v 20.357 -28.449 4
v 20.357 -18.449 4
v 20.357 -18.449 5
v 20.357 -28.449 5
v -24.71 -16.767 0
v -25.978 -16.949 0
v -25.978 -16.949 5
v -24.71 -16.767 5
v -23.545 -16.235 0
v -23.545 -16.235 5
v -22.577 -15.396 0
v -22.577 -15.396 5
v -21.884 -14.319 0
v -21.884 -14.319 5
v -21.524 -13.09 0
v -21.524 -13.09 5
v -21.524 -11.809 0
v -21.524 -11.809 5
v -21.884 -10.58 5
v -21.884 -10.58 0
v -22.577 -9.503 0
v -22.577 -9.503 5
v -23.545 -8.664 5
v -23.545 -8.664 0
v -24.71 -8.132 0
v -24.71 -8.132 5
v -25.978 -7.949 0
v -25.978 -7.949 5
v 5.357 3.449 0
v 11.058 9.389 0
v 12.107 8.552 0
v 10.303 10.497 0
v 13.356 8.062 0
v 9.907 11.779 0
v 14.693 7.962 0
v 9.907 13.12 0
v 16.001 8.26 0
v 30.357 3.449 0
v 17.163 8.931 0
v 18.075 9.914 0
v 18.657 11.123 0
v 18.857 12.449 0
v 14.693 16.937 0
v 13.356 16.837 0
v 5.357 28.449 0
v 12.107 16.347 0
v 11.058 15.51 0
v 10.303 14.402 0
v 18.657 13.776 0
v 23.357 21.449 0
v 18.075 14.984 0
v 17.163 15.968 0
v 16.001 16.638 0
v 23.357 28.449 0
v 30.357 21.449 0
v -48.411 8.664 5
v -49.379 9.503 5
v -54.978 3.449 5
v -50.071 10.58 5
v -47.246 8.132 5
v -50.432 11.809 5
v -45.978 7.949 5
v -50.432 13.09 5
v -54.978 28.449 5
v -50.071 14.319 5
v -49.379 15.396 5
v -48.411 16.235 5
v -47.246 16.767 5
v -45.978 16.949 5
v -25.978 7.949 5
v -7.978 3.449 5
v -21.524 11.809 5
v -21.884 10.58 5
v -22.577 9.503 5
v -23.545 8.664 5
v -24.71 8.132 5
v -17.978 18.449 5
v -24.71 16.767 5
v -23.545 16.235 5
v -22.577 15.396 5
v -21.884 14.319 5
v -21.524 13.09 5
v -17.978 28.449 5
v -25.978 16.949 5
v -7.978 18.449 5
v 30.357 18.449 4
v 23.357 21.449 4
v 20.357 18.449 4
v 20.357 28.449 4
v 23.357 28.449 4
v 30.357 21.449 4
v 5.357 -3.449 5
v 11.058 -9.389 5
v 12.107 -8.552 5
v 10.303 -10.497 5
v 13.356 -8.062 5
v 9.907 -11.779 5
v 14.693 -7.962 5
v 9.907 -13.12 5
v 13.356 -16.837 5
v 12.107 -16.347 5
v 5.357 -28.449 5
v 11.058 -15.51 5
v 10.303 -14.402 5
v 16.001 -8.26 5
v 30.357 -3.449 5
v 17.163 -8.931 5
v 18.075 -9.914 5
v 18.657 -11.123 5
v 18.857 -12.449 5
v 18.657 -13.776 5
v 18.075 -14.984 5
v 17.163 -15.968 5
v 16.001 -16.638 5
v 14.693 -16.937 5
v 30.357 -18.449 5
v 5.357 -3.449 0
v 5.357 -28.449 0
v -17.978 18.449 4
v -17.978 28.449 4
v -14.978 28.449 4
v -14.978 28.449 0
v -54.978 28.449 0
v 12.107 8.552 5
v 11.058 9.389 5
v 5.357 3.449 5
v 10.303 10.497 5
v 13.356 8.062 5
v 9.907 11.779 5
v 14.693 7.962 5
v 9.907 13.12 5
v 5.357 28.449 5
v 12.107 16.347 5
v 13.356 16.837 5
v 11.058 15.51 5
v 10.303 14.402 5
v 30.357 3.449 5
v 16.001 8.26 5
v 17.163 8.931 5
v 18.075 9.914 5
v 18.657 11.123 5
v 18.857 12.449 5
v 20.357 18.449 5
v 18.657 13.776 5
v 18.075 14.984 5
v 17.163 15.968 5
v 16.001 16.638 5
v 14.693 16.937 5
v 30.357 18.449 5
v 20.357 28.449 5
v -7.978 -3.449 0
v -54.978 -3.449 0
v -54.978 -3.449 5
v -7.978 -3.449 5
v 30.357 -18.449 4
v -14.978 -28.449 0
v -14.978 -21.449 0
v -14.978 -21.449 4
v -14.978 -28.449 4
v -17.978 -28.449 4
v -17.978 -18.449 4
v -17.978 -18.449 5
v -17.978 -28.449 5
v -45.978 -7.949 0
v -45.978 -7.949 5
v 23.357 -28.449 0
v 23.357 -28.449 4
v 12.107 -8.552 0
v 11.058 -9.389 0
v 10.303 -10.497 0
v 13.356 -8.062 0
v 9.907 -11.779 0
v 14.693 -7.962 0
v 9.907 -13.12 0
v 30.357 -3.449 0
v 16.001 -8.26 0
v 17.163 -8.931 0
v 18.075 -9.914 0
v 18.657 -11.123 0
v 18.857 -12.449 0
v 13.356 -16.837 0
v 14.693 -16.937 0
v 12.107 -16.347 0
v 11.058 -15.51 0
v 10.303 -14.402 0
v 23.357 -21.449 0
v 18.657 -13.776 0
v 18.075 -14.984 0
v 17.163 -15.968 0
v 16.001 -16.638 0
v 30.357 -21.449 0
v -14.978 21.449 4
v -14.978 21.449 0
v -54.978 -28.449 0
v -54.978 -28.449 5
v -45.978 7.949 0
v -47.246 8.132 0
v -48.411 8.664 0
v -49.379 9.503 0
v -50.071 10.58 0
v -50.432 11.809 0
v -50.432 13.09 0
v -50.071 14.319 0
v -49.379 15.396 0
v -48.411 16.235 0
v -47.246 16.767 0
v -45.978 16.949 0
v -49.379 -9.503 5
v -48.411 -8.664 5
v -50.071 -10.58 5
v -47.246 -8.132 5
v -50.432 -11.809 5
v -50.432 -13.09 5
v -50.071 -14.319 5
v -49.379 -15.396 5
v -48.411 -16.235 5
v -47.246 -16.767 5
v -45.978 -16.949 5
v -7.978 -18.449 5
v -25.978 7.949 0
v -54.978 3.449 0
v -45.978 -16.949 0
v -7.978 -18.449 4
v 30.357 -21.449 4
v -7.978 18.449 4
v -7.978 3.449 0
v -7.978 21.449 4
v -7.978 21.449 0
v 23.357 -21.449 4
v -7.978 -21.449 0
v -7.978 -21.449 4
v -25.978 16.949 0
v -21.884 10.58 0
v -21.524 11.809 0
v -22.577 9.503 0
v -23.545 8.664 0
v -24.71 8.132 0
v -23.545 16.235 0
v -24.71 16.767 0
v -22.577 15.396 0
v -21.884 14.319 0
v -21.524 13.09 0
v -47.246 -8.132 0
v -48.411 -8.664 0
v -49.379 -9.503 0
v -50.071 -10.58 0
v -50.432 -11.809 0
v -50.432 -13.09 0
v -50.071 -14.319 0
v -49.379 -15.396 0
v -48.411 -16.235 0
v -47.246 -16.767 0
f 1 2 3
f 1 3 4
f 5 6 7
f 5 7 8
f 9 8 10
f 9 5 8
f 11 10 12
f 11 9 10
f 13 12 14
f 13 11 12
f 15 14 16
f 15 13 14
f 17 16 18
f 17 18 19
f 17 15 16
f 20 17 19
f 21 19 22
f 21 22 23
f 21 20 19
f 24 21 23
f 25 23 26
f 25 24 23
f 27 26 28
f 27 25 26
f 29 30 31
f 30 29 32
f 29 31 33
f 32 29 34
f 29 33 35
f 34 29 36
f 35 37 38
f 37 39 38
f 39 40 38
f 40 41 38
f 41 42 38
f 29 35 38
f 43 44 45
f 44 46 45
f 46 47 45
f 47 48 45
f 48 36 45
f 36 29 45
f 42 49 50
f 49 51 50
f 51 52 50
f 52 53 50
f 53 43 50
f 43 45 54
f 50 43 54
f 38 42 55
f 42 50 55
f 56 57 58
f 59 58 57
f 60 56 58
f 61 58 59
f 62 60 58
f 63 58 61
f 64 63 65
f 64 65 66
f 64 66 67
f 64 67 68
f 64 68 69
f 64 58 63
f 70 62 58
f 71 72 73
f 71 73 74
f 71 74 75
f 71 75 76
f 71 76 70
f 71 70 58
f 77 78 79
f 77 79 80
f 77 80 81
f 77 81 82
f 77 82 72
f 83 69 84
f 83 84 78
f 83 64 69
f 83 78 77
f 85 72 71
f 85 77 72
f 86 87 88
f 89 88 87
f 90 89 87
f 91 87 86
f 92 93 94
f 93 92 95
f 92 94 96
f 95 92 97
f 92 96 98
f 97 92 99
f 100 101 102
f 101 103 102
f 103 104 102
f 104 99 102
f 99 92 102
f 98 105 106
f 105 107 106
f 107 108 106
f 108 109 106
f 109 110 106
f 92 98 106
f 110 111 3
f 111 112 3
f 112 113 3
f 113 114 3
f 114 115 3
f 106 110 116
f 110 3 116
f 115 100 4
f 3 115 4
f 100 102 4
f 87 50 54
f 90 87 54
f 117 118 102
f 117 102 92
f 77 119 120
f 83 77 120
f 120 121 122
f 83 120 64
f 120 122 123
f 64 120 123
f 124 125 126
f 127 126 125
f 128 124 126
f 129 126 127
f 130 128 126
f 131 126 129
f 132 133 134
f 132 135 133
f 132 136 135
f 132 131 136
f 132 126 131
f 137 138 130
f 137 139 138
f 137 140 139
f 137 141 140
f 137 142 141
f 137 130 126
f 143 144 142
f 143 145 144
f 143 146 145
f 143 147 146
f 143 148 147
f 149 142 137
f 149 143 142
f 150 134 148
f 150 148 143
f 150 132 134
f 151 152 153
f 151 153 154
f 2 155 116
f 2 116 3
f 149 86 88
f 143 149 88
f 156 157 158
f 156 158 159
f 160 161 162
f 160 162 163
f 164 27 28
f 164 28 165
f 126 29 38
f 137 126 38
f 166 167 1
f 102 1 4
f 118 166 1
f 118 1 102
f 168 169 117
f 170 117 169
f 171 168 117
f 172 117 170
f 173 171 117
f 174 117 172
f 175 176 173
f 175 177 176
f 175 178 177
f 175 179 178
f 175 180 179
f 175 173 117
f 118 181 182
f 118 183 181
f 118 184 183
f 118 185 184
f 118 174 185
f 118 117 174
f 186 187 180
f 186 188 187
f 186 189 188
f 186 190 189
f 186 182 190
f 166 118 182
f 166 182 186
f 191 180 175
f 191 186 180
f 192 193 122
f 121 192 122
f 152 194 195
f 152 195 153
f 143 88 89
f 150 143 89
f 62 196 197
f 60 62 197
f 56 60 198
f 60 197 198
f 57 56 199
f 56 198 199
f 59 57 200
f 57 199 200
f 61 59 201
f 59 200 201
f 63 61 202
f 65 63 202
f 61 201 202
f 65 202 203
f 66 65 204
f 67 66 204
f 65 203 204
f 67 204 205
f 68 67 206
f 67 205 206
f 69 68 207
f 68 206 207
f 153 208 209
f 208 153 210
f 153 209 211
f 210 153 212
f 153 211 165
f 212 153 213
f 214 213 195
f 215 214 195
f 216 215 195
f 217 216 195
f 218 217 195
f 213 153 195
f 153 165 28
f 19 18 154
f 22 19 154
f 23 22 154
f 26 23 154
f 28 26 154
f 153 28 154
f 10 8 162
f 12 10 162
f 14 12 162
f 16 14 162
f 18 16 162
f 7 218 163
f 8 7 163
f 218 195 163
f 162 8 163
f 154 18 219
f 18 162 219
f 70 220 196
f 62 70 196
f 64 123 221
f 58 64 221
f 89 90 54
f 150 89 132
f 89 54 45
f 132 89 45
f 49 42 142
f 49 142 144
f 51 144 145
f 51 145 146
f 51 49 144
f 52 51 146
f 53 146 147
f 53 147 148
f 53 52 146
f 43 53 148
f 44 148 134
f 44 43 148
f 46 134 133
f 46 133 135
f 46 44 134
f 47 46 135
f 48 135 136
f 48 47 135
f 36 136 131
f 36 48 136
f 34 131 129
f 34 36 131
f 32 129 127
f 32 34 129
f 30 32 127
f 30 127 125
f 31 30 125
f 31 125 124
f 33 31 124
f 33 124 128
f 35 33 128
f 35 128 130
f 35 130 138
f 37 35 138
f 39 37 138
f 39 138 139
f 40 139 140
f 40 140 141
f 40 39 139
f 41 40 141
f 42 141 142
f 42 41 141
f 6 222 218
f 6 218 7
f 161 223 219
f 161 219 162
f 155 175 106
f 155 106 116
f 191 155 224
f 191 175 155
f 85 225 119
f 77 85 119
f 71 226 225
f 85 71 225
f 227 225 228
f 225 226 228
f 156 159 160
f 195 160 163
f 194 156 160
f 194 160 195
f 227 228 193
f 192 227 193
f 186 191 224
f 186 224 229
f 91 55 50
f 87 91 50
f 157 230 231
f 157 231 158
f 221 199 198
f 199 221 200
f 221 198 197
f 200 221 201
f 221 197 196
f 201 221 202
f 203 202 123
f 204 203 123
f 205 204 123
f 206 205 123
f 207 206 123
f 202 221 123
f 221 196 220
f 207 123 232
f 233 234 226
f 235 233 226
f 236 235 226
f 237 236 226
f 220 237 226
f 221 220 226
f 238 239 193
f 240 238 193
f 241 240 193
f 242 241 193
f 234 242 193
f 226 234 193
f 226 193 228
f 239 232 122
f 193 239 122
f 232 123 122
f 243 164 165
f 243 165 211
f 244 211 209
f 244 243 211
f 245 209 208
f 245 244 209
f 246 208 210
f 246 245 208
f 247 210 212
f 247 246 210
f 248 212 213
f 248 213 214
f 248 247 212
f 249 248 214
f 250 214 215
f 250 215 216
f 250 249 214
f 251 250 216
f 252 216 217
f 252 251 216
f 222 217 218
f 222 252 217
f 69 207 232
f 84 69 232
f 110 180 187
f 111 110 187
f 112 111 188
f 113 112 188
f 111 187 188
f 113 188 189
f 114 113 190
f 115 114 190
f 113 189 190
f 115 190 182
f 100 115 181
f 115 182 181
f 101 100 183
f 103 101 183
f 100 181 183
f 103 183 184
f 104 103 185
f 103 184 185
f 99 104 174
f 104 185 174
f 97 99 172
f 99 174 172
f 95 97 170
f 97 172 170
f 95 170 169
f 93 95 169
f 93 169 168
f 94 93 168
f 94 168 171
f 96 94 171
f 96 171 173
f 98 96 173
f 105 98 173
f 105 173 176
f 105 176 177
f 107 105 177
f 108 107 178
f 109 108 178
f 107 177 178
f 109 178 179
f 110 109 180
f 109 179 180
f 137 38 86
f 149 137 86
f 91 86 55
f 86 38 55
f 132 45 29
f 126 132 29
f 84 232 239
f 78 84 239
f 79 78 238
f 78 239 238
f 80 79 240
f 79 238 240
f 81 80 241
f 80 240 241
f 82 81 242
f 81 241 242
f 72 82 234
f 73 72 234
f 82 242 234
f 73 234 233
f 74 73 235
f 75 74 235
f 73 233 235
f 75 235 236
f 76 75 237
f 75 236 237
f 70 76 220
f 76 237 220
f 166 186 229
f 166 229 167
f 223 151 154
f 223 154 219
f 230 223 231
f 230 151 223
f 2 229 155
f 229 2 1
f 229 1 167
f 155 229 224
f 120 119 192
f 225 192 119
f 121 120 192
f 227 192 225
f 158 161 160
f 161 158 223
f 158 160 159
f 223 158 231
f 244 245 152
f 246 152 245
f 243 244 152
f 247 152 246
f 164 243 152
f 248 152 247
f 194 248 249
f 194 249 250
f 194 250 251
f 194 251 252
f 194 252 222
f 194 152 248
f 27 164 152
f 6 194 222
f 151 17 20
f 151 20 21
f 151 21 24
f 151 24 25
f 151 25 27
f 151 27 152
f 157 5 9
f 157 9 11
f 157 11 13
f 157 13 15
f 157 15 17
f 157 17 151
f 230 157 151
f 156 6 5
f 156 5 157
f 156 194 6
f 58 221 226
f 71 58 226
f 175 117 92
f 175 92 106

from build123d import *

# Parameters (mm, degrees)
F0_R     = 4.5
F1_DEPTH = 5
F2_DEPTH = 4


with BuildPart() as f1:
    # F0 (on Top) → F1 (new body)
    with BuildSketch(Plane.XY):
        Polygon((-54.977827, 3.449424), (-7.977827, 3.449424), (-7.977827, 18.449424), (-17.977827, 18.449424), (-17.977827, 28.449424), (-54.977827, 28.449424), align=None)
        with BuildLine():
            ThreePointArc((-45.977827, 7.949424), (-50.477827, 12.449424), (-45.977827, 16.949424))
            Line((-45.977827, 16.949424), (-25.977827, 16.949424))
            ThreePointArc((-25.977827, 16.949424), (-21.477827, 12.449424), (-25.977827, 7.949424))
            Line((-25.977827, 7.949424), (-45.977827, 7.949424))
        make_face(mode=Mode.SUBTRACT)
        Polygon((5.357056, 28.449424), (5.357056, 3.449424), (30.357056, 3.449424), (30.357056, 18.449424), (20.357056, 18.449424), (20.357056, 28.449424), align=None)
        with Locations((14.357056, 12.449424)):
            Circle(F0_R, mode=Mode.SUBTRACT)
    extrude(amount=F1_DEPTH)

    # F0 (on Top) → F2 (join)
    with BuildSketch(Plane.XY):
        Polygon((-17.977827, 18.449424), (-7.977827, 18.449424), (-7.977827, 21.449424), (-14.977827, 21.449424), (-14.977827, 28.449424), (-17.977827, 28.449424), align=None)
        Polygon((23.357056, 28.449424), (20.357056, 28.449424), (20.357056, 18.449424), (30.357056, 18.449424), (30.357056, 21.449424), (23.357056, 21.449424), align=None)
    extrude(amount=F2_DEPTH)


with BuildPart() as f3_1:
    # F3: instance of F1
    add(f1.part.mirror(Plane.XZ))


solid = Compound([f1.part, f3_1.part])
